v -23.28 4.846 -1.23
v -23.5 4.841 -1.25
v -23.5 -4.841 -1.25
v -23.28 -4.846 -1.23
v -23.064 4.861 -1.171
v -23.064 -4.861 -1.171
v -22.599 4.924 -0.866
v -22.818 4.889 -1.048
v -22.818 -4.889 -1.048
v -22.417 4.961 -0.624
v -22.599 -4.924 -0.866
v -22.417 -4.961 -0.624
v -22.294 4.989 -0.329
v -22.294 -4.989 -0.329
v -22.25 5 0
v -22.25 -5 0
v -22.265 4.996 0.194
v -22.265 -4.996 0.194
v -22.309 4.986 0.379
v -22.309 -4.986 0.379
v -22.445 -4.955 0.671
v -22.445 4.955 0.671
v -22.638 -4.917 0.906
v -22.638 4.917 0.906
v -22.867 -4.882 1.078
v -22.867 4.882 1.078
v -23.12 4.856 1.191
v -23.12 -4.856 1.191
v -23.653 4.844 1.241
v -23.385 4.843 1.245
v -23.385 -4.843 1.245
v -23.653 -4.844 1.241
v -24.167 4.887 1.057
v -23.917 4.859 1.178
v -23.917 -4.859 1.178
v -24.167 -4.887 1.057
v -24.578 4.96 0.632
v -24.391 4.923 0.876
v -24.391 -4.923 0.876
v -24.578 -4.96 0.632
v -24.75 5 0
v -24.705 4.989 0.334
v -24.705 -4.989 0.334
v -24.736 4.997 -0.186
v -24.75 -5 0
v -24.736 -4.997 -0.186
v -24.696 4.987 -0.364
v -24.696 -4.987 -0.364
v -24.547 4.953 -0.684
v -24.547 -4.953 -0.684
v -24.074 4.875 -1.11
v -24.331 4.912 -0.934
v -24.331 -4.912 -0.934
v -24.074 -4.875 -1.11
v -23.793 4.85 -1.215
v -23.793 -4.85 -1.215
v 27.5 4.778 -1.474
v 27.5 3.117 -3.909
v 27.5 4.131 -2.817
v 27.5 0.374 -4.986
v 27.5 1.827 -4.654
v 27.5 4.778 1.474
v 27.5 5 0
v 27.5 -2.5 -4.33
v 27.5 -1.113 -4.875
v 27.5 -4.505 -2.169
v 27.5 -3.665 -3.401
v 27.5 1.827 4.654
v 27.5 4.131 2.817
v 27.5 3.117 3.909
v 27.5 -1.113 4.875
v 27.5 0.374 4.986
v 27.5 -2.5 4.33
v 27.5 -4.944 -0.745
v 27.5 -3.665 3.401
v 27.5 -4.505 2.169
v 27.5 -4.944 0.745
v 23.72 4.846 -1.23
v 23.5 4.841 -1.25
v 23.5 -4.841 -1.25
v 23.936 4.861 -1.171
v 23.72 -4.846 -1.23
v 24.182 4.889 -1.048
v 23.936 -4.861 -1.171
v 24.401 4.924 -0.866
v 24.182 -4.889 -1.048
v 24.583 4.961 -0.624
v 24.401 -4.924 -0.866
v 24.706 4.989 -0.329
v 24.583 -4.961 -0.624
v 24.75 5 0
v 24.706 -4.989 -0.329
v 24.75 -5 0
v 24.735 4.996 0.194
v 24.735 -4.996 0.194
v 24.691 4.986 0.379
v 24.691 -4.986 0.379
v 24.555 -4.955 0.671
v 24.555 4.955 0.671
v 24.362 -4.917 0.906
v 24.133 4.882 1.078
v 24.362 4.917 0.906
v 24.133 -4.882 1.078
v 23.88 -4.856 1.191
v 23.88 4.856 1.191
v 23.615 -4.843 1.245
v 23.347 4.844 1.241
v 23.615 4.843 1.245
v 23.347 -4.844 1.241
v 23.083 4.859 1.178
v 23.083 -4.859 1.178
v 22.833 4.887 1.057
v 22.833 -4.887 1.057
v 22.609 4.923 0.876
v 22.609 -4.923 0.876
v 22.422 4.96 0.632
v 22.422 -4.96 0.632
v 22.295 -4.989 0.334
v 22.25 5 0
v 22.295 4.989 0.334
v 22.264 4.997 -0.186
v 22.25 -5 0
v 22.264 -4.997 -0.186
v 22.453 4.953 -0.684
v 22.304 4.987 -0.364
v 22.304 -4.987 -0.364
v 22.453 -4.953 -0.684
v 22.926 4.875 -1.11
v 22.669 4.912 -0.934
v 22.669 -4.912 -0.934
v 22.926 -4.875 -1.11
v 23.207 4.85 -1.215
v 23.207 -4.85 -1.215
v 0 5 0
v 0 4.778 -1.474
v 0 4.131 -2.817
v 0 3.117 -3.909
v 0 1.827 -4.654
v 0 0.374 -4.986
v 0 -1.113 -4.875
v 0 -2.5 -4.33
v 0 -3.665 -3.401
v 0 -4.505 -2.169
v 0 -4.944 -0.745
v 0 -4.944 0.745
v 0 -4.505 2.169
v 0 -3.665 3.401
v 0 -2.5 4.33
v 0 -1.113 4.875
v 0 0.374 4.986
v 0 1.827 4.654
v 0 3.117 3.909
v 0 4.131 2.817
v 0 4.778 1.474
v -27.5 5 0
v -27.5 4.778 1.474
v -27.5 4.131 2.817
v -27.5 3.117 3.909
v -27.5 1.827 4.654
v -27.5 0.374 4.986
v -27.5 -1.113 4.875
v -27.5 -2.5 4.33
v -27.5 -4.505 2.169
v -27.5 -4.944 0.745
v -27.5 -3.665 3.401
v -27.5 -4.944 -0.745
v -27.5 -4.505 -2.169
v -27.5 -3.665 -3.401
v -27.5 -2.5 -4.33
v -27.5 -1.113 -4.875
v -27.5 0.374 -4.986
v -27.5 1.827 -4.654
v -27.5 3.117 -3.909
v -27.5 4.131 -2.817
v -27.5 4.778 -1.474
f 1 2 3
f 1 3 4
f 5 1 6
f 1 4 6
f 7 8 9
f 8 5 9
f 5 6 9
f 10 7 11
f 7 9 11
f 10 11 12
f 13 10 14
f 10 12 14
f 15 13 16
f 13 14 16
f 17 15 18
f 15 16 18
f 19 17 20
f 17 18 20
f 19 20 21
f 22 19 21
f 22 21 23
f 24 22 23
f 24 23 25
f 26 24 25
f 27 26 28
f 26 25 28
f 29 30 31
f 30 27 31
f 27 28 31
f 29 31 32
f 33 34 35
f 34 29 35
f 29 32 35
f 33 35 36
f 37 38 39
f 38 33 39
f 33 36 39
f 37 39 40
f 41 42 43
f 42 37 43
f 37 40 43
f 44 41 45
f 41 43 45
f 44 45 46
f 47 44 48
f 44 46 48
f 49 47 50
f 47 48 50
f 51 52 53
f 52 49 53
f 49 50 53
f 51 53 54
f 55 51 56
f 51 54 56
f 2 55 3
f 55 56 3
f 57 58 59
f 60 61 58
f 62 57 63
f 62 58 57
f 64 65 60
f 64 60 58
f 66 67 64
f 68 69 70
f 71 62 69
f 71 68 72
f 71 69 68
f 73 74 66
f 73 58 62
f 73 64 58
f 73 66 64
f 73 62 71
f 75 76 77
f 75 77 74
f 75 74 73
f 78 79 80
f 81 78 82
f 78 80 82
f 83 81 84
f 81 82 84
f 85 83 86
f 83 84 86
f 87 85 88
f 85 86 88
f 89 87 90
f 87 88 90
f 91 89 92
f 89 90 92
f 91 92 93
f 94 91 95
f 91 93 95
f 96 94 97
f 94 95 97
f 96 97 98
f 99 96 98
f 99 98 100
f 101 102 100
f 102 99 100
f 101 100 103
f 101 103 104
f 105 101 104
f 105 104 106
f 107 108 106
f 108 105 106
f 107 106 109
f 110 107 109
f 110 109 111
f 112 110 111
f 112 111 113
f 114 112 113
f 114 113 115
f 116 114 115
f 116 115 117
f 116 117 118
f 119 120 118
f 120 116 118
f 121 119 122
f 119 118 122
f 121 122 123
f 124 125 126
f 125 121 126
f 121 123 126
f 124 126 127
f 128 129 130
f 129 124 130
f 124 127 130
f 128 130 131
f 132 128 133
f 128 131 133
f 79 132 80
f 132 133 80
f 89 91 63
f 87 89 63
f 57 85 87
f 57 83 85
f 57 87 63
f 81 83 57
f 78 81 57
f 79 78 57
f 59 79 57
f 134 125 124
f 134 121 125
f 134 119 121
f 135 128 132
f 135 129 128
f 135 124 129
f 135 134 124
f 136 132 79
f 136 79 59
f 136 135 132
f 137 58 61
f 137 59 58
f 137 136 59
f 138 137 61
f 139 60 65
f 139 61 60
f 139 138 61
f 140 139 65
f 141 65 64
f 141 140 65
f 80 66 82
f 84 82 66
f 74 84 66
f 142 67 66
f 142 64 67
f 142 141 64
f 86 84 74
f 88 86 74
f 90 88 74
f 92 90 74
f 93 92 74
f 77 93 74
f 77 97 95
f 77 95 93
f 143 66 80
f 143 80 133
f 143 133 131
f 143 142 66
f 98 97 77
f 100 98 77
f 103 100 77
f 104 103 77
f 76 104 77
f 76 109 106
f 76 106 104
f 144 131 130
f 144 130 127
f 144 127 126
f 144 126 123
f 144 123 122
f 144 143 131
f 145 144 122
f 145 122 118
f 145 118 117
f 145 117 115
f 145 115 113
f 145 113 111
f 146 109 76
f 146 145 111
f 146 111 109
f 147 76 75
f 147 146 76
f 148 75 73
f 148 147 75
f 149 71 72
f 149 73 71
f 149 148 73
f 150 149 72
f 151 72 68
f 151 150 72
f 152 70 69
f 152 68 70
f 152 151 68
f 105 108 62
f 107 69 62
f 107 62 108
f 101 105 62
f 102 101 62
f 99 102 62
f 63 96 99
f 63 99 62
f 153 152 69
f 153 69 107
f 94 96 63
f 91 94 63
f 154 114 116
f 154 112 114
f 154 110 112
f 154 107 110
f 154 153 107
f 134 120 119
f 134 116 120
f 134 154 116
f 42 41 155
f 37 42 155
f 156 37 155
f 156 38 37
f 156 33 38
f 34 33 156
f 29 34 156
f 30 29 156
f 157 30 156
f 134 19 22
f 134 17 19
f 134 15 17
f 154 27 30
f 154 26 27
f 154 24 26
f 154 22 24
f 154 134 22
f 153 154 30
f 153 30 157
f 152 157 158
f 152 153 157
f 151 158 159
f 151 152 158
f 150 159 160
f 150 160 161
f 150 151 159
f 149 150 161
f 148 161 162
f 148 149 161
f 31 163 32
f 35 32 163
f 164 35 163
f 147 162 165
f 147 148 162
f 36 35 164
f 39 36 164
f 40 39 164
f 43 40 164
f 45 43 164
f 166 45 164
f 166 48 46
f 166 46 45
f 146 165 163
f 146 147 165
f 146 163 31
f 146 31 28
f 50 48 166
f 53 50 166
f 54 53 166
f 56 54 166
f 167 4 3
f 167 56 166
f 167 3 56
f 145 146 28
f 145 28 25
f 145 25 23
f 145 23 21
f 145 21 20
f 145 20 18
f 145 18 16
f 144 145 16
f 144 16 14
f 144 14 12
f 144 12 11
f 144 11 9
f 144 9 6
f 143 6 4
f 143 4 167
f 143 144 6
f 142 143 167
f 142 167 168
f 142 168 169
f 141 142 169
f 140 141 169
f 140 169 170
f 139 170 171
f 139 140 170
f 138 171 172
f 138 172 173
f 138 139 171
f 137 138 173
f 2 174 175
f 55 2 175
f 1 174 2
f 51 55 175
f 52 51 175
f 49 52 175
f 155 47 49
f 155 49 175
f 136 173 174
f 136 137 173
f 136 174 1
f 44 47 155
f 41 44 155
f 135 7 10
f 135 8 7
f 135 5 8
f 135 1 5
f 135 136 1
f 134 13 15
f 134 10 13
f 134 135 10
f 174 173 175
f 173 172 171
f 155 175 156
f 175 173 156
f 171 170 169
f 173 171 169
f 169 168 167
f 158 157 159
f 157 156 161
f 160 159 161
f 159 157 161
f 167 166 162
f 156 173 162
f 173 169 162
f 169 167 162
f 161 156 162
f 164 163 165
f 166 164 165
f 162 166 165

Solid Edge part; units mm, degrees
sketch "Sketch1" plane through (0, 0, 0) normal (1, 0, 0) x (0, 1, 0)
  circle A0 centre (0, 0) radius 5
extrude "Protrusion1" add sketch "Sketch1" along normal mid plane 55
cosmetic_thread "Thread_2" size "M10" thread depth 15
cosmetic_thread "Thread_3" size "M10" thread depth 15
hole "Hole_1" at (23.5, -5, 0) direction (0, 1, 0) diameter 2.5 end up to next
hole "Hole1" at (-23.5, -5, 0) direction (0, 1, 0) diameter 2.5 end up to next
